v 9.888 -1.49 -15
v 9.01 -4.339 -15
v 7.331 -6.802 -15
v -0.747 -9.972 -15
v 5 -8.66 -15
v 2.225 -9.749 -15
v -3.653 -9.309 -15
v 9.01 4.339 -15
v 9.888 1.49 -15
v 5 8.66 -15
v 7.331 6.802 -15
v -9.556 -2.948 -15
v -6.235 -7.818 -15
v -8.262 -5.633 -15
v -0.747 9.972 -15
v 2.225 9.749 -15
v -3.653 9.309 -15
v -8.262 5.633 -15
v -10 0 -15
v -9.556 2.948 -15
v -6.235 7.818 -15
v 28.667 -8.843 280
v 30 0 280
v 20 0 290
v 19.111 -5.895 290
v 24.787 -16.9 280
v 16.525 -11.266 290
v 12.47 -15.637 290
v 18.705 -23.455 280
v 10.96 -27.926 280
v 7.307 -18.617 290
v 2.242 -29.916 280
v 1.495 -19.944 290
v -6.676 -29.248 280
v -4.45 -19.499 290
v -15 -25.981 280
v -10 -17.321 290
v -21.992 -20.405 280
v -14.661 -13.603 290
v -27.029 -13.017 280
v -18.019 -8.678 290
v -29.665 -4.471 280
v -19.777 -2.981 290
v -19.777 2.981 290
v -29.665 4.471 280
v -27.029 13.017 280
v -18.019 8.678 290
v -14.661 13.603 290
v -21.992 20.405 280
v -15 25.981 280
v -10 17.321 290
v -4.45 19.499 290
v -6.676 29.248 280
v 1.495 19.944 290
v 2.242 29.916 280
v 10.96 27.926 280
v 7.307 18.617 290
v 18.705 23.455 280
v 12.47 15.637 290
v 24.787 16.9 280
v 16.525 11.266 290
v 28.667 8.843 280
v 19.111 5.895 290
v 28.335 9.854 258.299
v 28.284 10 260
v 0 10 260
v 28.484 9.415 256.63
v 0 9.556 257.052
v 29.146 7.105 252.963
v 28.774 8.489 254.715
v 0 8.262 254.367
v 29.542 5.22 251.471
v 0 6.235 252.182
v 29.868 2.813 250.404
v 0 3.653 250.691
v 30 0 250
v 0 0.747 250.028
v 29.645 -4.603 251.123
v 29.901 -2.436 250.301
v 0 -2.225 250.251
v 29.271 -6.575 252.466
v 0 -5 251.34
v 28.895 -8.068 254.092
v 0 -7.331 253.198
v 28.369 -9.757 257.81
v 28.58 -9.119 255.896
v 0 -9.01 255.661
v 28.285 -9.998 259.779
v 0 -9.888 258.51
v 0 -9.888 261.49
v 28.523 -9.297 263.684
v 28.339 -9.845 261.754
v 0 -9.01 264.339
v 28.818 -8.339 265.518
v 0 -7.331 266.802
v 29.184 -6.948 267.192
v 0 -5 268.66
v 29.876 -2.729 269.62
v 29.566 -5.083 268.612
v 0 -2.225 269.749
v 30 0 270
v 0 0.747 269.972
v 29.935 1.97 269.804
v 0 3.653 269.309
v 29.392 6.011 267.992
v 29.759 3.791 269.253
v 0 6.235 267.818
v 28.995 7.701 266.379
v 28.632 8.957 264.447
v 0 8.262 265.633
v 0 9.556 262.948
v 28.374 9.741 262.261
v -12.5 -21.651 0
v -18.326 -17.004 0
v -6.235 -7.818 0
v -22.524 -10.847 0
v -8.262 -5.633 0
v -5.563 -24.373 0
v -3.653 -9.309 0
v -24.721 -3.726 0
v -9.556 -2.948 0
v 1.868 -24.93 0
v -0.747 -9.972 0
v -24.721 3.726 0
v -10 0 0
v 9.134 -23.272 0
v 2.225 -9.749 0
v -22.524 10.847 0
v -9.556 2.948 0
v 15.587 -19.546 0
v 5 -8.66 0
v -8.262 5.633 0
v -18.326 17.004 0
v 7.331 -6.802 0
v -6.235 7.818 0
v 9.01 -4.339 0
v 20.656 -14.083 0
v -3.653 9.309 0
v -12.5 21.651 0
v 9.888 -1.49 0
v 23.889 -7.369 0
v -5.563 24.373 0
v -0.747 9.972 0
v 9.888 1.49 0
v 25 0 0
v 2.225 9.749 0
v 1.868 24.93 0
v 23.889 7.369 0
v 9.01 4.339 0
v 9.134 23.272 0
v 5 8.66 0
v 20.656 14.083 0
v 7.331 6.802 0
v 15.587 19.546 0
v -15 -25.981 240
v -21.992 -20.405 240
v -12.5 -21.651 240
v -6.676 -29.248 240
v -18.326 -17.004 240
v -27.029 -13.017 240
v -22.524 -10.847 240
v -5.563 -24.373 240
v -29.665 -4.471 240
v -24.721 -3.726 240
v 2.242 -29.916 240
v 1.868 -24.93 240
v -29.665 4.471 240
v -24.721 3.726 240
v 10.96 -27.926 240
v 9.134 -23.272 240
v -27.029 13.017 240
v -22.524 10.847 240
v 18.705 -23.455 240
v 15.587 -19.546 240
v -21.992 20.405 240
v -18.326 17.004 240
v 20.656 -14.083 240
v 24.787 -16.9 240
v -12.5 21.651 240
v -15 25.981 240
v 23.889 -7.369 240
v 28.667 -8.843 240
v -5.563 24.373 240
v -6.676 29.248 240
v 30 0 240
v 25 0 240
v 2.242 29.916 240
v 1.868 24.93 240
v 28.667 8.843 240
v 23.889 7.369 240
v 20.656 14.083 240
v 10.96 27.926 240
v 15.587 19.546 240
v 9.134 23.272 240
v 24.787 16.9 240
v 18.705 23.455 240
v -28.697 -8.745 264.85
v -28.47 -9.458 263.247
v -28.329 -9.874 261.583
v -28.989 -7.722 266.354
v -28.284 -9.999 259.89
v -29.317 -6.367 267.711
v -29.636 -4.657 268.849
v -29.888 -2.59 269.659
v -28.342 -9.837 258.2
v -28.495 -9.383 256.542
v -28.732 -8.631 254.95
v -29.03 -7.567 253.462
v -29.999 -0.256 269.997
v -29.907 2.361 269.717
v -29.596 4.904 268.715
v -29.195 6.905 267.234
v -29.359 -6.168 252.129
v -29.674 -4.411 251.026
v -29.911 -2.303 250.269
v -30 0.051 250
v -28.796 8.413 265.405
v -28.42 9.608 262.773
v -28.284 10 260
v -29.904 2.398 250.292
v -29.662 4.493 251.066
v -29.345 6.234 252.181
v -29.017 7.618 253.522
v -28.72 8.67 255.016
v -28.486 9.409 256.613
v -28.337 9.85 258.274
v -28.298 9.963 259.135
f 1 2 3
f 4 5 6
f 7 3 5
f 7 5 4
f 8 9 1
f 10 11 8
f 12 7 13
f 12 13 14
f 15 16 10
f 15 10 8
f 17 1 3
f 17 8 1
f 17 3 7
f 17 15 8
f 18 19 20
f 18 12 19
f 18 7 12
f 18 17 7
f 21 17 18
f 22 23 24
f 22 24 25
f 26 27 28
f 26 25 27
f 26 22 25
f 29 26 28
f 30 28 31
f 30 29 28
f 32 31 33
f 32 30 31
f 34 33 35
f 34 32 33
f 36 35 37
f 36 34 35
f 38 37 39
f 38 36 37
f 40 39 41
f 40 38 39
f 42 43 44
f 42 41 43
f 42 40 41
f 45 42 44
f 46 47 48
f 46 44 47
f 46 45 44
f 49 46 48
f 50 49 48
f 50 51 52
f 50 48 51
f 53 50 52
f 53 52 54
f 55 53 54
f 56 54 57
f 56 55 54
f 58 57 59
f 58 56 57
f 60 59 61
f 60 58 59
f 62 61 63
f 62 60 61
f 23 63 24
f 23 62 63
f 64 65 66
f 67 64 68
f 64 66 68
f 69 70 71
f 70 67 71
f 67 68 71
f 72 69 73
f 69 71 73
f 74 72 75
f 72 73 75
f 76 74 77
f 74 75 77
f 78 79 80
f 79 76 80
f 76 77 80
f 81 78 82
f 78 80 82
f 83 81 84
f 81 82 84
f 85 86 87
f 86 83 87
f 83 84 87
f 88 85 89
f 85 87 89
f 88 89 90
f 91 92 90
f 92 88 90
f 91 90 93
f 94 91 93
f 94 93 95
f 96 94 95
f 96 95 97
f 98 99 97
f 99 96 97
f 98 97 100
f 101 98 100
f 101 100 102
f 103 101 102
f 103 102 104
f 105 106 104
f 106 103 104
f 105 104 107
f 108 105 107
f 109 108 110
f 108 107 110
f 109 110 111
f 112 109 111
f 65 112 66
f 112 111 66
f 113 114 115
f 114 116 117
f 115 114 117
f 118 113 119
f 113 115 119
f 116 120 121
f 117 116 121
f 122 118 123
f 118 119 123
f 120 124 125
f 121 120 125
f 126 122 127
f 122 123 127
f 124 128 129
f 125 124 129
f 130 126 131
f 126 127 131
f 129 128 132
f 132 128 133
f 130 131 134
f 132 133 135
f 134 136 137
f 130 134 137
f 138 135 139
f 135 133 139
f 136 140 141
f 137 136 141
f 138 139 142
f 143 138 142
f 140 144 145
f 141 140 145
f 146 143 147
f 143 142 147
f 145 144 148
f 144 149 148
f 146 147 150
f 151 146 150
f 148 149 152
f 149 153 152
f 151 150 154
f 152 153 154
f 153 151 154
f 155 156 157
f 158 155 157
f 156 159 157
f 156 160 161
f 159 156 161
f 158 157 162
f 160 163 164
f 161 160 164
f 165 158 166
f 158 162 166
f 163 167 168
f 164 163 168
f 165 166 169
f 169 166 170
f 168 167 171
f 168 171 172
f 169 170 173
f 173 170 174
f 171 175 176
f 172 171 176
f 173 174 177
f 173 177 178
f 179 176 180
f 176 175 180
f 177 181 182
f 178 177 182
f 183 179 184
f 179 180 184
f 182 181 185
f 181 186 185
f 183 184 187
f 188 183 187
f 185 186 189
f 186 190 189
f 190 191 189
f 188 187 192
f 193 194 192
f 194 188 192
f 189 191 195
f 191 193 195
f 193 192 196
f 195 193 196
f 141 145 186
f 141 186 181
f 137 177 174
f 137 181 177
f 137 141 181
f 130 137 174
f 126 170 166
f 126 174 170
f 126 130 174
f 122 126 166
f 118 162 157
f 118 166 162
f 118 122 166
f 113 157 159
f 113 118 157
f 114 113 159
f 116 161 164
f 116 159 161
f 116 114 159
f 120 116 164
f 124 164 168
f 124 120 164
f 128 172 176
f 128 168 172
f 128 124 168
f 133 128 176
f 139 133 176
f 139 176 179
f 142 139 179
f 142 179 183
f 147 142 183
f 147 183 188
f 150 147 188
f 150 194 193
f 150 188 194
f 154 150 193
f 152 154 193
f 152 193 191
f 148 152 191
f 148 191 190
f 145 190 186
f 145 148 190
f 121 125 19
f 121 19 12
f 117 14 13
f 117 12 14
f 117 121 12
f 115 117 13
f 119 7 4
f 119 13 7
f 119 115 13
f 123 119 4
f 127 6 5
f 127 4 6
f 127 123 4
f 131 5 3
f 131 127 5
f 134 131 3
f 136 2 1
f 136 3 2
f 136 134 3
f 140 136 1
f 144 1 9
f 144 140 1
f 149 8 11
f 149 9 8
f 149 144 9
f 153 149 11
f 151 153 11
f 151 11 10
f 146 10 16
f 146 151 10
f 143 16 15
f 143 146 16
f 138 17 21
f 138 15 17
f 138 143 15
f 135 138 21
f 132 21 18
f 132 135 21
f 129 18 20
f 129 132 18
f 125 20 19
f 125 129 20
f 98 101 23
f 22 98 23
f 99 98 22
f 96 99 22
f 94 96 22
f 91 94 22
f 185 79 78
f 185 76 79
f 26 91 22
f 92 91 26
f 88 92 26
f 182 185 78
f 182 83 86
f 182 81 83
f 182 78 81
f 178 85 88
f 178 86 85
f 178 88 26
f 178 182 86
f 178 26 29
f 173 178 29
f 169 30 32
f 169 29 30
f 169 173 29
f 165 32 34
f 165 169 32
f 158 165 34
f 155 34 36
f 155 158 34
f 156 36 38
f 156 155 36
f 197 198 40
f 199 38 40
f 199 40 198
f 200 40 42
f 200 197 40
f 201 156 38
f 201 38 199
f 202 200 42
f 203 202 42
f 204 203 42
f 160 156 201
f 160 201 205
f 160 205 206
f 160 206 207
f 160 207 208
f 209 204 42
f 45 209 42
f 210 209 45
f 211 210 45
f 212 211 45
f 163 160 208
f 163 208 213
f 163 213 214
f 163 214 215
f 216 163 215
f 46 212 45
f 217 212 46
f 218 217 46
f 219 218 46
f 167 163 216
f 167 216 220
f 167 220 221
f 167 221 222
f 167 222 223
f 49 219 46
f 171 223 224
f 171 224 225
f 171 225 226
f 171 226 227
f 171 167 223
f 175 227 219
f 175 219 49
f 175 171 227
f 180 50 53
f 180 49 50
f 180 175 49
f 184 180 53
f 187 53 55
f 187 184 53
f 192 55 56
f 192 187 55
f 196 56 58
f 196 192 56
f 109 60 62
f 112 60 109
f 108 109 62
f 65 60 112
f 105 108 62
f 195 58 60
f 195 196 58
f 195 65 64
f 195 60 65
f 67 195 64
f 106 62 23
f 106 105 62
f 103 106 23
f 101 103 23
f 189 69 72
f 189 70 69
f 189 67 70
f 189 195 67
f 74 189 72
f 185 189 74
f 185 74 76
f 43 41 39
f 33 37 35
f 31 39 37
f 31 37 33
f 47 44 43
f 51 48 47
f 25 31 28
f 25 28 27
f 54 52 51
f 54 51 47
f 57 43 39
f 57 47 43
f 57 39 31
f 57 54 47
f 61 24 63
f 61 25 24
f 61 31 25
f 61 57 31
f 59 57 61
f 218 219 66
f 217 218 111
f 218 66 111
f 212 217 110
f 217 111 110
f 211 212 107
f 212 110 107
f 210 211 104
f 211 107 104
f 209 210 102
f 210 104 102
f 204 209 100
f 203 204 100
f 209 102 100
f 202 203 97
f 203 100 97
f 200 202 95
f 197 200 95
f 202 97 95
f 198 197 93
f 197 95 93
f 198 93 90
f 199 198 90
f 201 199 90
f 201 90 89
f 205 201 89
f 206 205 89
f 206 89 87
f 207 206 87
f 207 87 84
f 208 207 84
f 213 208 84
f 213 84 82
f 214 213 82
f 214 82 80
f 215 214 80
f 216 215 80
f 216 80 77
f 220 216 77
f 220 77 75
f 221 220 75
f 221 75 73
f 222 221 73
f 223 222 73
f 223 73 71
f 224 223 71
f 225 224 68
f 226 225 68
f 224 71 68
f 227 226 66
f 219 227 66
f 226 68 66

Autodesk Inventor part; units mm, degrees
ref_plane "YZ Plane" through (0, 0, 0) normal (1, 0, 0) x (0, 1, 0)
ref_plane "XZ Plane" through (0, 0, 0) normal (0, 1, 0) x (-1, 0, 0)
ref_plane "XY Plane" through (0, 0, 0) normal (0, 0, 1) x (1, 0, 0)
sketch "Esboço1" plane through (0, 0, 0) normal (0, 0, 1) x (1, 0, 0)
  circle A0 centre (0, 0) radius 25
  dimension "d0" = 50
extrude "Extrusão1" add sketch "Esboço1" along normal blind 240
sketch "Esboço2" plane through (0, 0, 240) normal (0, 0, 1) x (1, 0, 0)
  circle A0 centre (0, 0) radius 30
  dimension "d3" = 60
extrude "Extrusão2" add sketch "Esboço2" along normal blind 50
chamfer "Chanfro1" distance 10 angle 45 1 edges at (-30, 0, 290)
thread "Rosca1" size "M50x4" class "6g" standard "ANSI Metric M Profile" length 240
sketch "Esboço3" plane through (0, 0, 0) normal (1, 0, 0) x (0, 1, 0)
  line L0 (30, 280) -> (-30, 280) construction
  line L1 (30, 240) -> (-30, 240) construction
  line L2 (30, 280) -> (-30, 240) construction
  line L3 (30, 240) -> (-30, 280) construction
  circle A0 centre (0, 260) radius 10
  point P0 (0, 0)
  dimension "d11" = 20
extrude "Extrusão3" cut sketch "Esboço3" along normal through all both and the other way through all
sketch "Esboço4" plane through (0, 0, 0) normal (0, 0, -1) x (-1, 0, 0)
  circle A0 centre (0, 0) radius 10
  dimension "d14" = 20
extrude "Extrusão4" add sketch "Esboço4" along normal blind 15
properties part number "Prisioneiro"
